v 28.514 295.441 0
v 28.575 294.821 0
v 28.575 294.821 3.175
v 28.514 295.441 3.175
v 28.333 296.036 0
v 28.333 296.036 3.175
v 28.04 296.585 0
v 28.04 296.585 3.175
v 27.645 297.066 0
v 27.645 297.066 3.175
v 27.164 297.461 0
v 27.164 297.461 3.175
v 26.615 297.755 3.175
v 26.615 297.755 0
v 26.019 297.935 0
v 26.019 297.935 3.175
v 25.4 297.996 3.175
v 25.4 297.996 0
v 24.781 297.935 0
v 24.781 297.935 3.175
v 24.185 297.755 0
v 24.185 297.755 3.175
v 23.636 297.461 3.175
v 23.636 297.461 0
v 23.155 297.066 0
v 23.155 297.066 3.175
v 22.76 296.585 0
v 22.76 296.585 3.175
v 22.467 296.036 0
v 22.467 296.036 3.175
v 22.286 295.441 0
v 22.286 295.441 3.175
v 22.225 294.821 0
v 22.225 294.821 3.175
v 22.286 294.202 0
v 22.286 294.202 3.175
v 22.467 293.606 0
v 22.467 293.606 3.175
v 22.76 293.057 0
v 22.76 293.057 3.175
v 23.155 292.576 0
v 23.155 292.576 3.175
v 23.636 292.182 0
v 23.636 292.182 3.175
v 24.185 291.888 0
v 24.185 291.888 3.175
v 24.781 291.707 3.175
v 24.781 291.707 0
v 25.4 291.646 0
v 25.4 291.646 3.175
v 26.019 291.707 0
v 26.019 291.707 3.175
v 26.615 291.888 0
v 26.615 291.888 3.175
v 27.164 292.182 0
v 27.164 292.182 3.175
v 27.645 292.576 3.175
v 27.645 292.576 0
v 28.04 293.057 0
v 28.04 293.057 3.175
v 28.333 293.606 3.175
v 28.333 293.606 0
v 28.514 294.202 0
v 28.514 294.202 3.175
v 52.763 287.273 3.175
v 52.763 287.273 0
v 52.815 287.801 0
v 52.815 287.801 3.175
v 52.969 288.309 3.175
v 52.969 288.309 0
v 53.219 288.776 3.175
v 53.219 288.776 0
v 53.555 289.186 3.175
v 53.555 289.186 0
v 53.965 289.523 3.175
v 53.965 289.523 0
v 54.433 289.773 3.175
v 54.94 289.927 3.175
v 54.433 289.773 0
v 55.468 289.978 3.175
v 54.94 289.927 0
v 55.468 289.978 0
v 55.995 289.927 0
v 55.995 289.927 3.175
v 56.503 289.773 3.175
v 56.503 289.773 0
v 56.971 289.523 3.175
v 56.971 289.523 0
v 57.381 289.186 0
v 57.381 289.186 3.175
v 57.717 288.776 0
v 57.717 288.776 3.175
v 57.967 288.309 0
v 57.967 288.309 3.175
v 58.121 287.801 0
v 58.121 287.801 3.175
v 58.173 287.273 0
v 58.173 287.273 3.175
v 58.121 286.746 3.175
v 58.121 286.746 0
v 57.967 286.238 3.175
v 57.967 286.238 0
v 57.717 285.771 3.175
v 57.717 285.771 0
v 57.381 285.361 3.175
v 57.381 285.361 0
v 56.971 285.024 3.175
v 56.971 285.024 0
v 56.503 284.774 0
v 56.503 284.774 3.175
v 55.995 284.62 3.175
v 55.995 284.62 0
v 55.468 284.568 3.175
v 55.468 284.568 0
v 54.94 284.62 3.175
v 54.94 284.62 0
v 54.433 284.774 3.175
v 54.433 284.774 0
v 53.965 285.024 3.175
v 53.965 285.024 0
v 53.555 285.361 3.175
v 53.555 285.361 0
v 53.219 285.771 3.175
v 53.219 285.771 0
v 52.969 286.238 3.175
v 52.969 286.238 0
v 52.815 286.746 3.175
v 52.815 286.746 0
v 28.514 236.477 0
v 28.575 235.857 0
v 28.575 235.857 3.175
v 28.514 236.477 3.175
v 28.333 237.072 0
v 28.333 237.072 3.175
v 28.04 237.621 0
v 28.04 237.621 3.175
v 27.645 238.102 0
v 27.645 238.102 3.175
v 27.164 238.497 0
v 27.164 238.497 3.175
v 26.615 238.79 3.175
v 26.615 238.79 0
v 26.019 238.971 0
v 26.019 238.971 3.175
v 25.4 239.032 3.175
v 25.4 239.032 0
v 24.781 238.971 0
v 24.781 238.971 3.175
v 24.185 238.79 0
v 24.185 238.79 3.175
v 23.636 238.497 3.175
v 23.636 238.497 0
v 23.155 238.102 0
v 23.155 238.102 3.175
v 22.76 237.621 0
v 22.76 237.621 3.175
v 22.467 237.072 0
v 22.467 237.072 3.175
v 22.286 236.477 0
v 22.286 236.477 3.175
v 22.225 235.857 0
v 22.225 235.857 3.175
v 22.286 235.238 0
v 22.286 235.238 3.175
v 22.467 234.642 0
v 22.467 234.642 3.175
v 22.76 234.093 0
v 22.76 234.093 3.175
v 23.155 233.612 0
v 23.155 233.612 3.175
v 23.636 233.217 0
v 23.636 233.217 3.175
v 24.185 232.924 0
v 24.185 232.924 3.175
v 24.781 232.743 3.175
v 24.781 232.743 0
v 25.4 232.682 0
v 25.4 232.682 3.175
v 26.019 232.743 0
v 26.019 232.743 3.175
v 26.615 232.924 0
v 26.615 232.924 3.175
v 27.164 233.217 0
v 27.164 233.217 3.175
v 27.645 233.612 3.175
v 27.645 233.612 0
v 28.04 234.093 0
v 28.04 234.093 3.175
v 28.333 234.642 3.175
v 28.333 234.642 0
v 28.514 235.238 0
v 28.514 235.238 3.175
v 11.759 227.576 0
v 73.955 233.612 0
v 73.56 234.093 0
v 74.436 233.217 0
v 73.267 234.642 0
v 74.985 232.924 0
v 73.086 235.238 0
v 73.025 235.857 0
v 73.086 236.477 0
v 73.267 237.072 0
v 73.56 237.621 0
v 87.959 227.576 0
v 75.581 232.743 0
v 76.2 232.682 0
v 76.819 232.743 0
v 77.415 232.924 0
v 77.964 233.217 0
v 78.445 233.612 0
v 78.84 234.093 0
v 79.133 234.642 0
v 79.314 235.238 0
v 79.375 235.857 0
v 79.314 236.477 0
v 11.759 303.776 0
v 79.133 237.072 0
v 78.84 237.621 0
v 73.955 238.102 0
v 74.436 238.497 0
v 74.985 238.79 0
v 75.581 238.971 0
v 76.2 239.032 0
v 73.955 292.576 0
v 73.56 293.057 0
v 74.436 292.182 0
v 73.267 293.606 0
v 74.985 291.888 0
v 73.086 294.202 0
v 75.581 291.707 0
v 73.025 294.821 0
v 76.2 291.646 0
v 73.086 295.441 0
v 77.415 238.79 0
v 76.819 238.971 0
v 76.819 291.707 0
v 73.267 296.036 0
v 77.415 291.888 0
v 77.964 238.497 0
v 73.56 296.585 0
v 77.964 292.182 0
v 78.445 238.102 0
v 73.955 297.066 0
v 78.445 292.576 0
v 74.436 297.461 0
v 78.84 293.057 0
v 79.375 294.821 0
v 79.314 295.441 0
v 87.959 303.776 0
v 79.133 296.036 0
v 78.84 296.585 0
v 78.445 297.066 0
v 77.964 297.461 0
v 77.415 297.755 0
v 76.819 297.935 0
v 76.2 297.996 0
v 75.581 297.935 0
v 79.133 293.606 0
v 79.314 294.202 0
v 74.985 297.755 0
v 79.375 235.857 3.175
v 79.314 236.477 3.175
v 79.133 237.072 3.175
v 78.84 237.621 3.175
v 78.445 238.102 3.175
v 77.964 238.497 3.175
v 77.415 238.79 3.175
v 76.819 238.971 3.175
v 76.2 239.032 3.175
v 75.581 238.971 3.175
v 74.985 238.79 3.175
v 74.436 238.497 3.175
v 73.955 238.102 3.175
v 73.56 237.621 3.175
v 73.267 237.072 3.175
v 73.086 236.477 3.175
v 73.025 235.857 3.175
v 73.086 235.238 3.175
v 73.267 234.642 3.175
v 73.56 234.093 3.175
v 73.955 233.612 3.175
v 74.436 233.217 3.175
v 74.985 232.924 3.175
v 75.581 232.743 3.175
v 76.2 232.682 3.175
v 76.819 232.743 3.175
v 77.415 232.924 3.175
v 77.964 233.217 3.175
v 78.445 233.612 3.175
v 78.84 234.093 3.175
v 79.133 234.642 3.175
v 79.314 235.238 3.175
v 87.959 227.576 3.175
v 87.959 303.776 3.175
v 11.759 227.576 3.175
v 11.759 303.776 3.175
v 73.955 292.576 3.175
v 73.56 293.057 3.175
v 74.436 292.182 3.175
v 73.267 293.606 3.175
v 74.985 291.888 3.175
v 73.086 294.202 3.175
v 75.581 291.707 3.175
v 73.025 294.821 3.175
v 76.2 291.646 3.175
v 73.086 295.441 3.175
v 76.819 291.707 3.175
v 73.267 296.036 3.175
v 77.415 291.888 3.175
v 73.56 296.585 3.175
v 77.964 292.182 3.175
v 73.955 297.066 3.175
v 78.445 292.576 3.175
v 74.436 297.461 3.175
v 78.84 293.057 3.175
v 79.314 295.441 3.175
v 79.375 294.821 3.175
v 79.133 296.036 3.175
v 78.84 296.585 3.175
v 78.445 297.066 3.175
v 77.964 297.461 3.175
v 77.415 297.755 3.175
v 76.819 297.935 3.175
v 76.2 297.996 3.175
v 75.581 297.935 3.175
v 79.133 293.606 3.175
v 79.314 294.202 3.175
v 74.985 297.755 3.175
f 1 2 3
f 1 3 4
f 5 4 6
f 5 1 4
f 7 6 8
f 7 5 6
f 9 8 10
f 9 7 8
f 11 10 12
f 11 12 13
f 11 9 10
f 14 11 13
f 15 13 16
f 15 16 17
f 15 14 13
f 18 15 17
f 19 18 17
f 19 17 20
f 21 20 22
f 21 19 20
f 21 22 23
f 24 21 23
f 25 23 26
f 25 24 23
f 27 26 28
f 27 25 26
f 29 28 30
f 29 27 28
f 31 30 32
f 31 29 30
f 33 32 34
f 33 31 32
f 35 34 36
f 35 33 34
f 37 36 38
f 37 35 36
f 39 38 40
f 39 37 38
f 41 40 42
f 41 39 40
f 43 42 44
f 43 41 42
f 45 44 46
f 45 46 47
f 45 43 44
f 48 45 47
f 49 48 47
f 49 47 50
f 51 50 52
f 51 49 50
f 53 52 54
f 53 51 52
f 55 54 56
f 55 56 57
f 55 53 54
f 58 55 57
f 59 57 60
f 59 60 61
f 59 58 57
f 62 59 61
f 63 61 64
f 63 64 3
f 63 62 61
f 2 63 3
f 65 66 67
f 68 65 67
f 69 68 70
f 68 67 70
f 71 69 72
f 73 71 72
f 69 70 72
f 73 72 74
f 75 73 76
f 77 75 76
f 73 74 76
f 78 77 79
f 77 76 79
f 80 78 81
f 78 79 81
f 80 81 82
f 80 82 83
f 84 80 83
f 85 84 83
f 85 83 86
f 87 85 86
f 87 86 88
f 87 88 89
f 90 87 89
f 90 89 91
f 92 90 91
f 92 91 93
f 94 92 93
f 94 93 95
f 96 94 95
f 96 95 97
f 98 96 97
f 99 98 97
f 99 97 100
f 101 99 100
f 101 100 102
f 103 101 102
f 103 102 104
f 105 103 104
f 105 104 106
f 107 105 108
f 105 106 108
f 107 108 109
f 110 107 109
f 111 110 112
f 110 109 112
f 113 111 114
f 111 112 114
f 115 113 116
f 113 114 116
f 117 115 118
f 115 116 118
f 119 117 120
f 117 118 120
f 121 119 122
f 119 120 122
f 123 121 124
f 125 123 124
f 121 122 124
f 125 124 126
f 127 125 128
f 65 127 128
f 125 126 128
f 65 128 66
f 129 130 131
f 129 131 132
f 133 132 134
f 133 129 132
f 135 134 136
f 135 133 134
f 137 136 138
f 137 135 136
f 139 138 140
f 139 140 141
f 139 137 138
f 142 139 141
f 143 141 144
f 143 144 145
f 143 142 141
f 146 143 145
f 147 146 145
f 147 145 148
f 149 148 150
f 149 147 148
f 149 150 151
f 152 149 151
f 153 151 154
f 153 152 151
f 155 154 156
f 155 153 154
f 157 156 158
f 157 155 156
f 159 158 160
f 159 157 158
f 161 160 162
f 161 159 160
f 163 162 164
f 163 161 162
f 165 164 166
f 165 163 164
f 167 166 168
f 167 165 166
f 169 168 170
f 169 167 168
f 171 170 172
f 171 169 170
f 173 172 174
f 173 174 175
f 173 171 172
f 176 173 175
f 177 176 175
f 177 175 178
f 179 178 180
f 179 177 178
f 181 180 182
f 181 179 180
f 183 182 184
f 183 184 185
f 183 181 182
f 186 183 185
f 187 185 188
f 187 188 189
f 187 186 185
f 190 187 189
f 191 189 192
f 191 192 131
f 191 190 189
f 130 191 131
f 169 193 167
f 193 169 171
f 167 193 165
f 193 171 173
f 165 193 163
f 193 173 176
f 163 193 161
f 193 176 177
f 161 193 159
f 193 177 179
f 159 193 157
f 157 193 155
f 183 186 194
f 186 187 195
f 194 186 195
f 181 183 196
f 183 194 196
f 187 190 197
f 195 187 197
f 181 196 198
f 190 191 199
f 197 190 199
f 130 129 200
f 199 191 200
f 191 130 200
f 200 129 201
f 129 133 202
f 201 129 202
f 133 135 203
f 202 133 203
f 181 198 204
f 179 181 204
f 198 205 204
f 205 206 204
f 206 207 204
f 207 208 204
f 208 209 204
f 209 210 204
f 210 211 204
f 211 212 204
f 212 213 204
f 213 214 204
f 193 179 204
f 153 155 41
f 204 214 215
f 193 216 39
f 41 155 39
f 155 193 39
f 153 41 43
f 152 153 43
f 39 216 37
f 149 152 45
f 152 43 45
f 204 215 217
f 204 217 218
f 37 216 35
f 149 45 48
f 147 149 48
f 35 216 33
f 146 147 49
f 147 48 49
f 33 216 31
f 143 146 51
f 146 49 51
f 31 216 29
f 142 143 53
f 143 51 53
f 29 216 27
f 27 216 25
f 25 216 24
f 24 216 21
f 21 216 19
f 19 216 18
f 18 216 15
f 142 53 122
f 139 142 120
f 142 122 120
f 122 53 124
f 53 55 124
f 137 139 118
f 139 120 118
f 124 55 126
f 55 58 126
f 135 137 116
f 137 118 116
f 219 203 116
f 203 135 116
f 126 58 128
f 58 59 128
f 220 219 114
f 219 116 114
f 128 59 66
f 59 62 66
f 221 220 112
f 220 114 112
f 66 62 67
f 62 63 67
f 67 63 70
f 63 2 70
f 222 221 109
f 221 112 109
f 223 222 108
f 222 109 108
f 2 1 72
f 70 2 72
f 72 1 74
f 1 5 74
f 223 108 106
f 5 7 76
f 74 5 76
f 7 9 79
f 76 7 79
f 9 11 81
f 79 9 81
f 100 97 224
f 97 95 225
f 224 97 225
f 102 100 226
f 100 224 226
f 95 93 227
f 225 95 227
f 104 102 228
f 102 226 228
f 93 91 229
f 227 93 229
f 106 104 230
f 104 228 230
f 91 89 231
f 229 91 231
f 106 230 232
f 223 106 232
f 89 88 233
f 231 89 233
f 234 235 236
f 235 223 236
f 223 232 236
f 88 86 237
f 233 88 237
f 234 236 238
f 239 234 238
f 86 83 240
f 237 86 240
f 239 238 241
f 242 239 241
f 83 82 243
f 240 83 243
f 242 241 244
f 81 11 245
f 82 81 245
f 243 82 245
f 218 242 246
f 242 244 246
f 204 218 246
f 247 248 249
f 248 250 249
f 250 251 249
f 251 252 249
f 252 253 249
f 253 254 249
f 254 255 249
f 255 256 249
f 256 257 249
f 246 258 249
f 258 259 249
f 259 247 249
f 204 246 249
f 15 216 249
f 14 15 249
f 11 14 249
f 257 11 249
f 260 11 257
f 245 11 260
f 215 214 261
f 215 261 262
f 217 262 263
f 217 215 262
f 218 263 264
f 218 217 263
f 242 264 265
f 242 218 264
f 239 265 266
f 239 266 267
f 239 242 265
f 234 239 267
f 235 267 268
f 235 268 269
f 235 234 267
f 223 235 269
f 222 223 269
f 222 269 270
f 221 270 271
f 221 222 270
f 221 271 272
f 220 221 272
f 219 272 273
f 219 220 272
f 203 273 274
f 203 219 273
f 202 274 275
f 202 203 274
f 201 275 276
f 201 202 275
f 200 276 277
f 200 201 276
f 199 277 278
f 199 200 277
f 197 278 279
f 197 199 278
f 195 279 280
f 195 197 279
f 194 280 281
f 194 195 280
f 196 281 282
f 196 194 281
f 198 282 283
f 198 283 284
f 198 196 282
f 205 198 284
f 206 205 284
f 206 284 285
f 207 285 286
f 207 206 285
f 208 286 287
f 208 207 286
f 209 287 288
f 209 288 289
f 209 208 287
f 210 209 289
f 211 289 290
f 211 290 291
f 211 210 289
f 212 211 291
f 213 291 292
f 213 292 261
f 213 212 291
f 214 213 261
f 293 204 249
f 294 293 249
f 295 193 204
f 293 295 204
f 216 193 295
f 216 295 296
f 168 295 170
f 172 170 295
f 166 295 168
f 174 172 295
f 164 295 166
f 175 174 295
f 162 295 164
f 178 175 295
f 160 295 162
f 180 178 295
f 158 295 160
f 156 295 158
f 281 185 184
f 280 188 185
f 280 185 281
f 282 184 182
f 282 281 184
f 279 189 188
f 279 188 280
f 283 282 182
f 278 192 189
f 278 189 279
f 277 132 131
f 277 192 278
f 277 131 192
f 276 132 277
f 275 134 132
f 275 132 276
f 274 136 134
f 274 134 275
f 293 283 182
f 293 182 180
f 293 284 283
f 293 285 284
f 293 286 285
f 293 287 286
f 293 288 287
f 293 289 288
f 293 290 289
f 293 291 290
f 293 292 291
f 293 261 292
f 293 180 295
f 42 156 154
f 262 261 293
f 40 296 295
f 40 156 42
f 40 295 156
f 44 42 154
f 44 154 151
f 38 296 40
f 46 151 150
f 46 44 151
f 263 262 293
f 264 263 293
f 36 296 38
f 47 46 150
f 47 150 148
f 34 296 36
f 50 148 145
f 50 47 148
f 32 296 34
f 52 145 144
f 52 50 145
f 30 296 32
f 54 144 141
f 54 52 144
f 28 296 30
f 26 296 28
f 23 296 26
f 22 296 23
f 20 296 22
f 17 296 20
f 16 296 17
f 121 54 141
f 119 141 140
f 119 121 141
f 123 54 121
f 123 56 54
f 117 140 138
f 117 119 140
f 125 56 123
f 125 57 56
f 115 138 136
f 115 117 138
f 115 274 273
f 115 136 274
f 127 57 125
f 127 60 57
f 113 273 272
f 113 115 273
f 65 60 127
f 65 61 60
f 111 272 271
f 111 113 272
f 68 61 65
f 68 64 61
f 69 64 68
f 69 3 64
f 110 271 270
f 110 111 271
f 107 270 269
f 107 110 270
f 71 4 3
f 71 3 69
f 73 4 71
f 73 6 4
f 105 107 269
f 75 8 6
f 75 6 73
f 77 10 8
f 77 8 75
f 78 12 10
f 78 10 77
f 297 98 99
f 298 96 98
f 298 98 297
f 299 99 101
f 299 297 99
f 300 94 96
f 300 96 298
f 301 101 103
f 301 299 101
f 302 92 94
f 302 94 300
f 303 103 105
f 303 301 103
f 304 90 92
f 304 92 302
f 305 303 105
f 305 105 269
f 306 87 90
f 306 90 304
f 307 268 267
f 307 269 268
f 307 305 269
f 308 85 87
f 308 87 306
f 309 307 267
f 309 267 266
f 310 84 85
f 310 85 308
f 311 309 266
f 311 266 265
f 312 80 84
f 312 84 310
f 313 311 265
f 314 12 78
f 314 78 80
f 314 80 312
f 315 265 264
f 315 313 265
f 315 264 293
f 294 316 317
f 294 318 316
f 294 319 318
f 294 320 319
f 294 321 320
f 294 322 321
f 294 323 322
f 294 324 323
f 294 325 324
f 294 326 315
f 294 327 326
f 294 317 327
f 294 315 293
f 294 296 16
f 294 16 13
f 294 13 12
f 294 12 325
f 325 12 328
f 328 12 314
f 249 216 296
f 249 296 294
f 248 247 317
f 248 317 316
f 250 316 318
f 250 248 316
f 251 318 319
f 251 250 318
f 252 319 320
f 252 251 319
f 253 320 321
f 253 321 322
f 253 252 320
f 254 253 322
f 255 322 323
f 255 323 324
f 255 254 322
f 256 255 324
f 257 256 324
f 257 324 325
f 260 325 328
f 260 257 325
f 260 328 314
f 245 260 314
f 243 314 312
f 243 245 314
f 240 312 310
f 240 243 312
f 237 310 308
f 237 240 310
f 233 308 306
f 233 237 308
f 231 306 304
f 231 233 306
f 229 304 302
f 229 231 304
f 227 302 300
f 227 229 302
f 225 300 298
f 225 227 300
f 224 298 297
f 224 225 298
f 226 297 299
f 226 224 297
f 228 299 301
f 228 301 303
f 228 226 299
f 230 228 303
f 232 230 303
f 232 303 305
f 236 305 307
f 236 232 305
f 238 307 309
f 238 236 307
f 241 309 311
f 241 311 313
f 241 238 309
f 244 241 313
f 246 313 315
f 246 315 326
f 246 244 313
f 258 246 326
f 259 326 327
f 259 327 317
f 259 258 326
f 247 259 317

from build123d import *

# Parameters (mm, degrees)
SKETCH1_W               = 76.2
SKETCH1_H               = 76.2
SKETCH1_R               = 3.175
BOSS_EXTRUDE1_DEPTH     = 3.175
F_1_4_28_TAPPED_HOLE3_D = 5.4102


with BuildPart() as part:
    # Sketch1 → Boss-Extrude1 (new body)
    with BuildSketch(Plane.XY):
        with Locations((49.8593053, 265.676157482)):
            Rectangle(SKETCH1_W, SKETCH1_H)
        with Locations((25.4, 235.857142857)):
            Circle(SKETCH1_R, mode=Mode.SUBTRACT)
        with Locations((25.4, 294.821428571)):
            Circle(SKETCH1_R, mode=Mode.SUBTRACT)
        with Locations((76.2, 235.857142857)):
            Circle(SKETCH1_R, mode=Mode.SUBTRACT)
        with Locations((76.2, 294.821428571)):
            Circle(SKETCH1_R, mode=Mode.SUBTRACT)
    extrude(amount=BOSS_EXTRUDE1_DEPTH)

    # 1/4-28 Tapped Hole3 (through all)
    with Locations(Plane.XY.offset(3.175)):
        with Locations((55.4677219, 287.273383219)):
            Hole(F_1_4_28_TAPPED_HOLE3_D / 2)


solid = part.part
